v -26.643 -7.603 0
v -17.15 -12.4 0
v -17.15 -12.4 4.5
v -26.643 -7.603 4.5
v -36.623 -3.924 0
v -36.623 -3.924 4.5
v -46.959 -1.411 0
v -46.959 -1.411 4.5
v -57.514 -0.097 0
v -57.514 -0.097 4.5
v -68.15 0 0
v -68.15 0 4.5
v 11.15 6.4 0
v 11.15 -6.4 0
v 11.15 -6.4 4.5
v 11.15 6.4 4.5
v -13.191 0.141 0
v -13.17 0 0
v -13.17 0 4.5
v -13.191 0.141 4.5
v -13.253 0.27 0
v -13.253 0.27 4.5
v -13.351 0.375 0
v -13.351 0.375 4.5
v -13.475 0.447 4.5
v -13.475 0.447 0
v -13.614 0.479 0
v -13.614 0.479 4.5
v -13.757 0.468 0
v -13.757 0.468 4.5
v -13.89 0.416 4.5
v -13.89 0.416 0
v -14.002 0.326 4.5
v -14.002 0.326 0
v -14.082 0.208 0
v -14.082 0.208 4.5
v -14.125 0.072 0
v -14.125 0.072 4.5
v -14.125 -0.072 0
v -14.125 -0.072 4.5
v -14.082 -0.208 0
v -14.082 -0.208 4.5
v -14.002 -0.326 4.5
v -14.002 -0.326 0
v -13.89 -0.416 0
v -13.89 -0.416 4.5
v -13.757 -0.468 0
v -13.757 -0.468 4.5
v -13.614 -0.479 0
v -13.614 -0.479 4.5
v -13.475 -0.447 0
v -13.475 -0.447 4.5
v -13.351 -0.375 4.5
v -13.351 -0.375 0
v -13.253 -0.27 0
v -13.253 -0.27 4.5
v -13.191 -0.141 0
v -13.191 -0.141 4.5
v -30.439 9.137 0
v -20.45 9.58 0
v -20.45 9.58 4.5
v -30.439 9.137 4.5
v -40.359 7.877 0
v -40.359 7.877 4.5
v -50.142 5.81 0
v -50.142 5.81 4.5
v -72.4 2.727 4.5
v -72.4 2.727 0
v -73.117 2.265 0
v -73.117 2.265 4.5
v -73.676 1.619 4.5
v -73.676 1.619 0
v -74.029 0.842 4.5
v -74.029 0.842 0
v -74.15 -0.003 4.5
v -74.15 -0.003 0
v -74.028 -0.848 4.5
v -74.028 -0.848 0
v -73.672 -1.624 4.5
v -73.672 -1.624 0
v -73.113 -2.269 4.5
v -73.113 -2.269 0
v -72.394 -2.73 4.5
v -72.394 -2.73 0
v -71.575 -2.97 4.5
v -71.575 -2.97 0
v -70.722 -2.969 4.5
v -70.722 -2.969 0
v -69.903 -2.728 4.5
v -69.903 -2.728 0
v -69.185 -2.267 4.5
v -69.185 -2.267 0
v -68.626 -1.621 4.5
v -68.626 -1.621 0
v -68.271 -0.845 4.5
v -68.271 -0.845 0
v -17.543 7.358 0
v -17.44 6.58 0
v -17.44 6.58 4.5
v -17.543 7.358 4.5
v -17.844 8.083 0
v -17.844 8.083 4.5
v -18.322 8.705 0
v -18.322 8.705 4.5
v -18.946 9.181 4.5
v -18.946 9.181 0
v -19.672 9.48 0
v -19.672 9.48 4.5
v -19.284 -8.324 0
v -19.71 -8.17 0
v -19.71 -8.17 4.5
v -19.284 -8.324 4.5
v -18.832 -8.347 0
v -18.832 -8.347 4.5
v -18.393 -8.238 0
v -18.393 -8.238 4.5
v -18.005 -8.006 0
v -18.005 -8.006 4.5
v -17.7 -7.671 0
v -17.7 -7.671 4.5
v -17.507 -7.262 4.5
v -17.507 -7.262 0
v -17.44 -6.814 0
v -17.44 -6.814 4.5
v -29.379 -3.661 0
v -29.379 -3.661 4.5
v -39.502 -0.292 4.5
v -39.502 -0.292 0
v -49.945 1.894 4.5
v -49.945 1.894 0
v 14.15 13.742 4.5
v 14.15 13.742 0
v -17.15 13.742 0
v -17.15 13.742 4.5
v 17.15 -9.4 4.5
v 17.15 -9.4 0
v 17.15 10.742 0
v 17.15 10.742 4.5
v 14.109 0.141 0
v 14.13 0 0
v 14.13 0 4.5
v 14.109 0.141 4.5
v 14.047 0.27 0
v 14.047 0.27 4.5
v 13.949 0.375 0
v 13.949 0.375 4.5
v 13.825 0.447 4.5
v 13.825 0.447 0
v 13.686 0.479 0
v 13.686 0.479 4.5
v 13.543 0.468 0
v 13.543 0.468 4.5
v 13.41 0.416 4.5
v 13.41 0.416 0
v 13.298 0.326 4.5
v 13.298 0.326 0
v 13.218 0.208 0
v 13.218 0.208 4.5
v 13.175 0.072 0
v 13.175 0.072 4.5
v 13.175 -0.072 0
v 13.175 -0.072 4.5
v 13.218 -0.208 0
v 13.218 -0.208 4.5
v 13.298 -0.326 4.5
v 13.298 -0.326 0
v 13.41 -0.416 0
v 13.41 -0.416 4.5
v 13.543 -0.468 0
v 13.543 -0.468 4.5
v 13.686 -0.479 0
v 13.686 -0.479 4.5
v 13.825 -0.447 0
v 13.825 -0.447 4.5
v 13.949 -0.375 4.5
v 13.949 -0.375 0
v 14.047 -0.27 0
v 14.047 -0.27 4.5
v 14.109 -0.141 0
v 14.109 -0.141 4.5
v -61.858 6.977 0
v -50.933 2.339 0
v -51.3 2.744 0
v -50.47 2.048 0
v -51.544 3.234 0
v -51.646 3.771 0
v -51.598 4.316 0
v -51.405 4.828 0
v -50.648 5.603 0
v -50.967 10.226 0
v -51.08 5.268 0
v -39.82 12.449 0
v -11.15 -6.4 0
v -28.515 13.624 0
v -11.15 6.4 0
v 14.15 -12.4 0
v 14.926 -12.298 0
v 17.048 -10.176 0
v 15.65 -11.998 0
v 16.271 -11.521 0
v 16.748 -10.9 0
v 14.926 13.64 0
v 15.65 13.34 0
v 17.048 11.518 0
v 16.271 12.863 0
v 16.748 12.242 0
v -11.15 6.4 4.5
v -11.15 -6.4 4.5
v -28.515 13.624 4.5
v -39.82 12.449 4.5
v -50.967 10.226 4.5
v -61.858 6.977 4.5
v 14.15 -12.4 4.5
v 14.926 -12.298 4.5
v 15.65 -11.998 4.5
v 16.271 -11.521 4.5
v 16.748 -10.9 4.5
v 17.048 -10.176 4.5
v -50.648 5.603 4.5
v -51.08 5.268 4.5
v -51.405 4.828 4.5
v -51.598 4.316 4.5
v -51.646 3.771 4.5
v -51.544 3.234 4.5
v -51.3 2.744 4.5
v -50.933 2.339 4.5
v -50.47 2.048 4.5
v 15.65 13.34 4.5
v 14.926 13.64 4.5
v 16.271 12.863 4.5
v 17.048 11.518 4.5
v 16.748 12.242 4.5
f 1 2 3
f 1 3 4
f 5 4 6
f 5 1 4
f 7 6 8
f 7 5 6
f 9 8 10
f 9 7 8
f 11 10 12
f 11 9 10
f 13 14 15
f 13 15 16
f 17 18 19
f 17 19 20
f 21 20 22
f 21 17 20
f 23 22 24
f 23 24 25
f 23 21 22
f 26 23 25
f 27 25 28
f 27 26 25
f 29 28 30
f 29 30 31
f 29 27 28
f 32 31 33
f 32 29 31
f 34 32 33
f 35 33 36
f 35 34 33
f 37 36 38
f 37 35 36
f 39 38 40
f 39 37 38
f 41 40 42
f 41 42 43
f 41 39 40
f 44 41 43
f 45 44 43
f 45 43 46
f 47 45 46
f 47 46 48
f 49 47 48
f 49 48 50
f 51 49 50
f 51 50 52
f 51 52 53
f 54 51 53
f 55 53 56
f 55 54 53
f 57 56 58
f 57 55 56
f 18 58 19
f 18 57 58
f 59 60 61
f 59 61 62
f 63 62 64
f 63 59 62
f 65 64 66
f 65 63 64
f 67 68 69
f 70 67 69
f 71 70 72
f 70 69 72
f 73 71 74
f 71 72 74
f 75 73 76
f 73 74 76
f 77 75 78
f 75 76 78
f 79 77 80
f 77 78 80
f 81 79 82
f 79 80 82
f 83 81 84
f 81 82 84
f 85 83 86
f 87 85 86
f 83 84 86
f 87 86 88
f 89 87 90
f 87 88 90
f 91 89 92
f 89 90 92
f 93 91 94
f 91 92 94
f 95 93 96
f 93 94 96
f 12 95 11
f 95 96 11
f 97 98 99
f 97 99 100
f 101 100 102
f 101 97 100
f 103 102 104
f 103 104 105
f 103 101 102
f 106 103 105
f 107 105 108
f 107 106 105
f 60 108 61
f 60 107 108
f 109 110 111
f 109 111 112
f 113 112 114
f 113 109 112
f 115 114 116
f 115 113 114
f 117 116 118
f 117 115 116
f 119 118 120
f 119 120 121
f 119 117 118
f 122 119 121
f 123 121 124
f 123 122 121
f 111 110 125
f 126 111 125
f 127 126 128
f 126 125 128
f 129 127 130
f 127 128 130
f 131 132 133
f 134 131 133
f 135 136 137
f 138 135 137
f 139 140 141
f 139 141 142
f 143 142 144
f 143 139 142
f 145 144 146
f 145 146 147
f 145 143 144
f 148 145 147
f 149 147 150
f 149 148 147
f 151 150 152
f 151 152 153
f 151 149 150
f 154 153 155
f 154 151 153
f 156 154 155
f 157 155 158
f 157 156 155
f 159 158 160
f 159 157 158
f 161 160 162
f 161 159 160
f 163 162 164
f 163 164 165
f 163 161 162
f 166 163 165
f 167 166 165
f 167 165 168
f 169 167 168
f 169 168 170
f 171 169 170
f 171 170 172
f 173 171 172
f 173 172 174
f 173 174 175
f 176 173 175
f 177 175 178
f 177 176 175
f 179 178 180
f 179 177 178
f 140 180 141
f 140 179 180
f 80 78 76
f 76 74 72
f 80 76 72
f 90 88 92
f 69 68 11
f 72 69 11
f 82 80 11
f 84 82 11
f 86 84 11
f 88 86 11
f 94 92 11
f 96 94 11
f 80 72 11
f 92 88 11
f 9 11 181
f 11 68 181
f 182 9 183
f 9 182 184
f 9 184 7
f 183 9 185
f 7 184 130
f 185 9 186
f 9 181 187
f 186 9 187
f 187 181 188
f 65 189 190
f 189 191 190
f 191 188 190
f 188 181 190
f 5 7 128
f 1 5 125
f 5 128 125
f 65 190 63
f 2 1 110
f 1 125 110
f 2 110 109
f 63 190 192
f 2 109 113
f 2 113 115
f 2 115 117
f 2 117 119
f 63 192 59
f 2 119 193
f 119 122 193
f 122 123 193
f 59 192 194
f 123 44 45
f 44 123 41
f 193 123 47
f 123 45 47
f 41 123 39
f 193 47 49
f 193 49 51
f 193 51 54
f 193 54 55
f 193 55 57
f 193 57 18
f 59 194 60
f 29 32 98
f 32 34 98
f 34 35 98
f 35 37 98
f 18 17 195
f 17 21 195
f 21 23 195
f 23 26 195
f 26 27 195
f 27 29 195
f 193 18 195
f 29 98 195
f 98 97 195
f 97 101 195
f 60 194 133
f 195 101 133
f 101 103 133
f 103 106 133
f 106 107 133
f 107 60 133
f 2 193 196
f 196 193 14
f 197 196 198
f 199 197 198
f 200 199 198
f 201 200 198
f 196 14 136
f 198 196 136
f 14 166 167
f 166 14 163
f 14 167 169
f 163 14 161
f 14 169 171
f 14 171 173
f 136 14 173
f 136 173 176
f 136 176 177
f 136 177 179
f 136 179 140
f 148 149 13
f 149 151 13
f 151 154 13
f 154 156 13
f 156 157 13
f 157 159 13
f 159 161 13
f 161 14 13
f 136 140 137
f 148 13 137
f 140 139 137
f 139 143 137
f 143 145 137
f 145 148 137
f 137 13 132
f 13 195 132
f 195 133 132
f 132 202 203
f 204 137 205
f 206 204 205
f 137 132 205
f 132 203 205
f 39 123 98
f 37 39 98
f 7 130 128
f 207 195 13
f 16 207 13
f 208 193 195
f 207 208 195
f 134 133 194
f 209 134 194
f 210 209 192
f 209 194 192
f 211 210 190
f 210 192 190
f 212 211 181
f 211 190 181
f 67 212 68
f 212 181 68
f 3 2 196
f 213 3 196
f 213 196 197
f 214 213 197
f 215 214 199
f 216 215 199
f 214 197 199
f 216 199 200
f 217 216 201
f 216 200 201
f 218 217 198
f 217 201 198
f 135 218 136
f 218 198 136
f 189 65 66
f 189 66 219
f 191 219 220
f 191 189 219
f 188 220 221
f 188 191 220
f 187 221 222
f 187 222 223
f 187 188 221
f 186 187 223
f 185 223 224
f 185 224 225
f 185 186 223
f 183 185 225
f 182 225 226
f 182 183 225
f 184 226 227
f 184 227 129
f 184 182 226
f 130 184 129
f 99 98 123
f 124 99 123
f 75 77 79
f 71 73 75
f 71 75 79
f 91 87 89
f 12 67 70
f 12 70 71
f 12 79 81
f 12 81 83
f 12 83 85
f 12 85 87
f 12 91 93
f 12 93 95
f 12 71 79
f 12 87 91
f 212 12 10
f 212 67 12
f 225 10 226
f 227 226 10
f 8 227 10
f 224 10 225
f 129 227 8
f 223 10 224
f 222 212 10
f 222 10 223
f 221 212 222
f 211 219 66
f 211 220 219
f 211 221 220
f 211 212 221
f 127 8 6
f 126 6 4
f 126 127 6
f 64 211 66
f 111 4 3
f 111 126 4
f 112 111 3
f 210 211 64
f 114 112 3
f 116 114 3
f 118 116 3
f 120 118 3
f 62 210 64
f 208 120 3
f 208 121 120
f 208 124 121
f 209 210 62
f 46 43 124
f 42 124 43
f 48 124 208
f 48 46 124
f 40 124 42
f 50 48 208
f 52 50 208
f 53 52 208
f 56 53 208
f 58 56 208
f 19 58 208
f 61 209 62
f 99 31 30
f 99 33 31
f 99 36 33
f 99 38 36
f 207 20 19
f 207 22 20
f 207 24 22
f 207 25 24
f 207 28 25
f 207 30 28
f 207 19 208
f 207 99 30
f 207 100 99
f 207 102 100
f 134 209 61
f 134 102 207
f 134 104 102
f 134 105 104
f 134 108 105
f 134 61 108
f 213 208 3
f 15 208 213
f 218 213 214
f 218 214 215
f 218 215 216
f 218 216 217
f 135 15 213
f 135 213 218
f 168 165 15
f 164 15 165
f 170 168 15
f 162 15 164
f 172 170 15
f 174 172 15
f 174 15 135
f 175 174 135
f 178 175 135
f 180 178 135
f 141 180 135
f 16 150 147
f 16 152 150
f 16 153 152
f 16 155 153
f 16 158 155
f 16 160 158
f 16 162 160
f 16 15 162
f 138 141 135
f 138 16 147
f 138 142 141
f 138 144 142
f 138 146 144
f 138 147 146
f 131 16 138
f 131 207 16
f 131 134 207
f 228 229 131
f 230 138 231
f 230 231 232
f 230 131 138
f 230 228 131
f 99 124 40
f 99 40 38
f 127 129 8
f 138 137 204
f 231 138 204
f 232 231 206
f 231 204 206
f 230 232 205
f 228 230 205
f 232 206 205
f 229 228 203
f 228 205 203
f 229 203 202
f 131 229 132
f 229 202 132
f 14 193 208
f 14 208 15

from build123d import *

# Parameters (mm, degrees)
SKETCH_R  = 0.48
SKETCH_W  = 22.3
SKETCH_H  = 12.8
PAD_DEPTH = 4.5


with BuildPart() as part:
    # Sketch → Pad (new body)
    with BuildSketch(Plane.XY):
        with BuildLine():
            Line((-17.15, -12.4), (14.15, -12.4))
            ThreePointArc((14.15, -12.4), (16.27132, -11.52132), (17.15, -9.4))
            Line((17.15, -9.4), (17.15, 10.741965))
            ThreePointArc((17.15, 10.741965), (16.27132, 12.863286), (14.15, 13.741965))
            Line((14.15, 13.741965), (-17.15, 13.741965))
            ThreePointArc((-17.15, 13.741965), (-45.41951, 11.467422), (-72.4, 2.727178))
            ThreePointArc((-72.4, 2.727178), (-72.770186, -2.524876), (-68.15, -1e-06))
            ThreePointArc((-17.15, -12.4), (-41.755087, -2.51931), (-68.15, -1e-06))
        make_face()
        with Locations((-13.65, 0)):
            Circle(SKETCH_R, mode=Mode.SUBTRACT)
        with Locations((13.65, 0)):
            Circle(SKETCH_R, mode=Mode.SUBTRACT)
        Rectangle(SKETCH_W, SKETCH_H, mode=Mode.SUBTRACT)
        with BuildLine():
            Line((-17.44, 6.580017), (-17.44, -6.814013))
            ThreePointArc((-19.71, -8.17), (-18.190253, -8.136095), (-17.44, -6.814013))
            ThreePointArc((-19.71, -8.17), (-34.392185, -1.83077), (-49.944735, 1.893553))
            ThreePointArc((-50.141709, 5.809641), (-51.645768, 3.770991), (-49.944735, 1.893553))
            ThreePointArc((-20.45, 9.58), (-35.411915, 8.608801), (-50.141709, 5.809641))
            ThreePointArc((-17.44, 6.580017), (-18.322218, 8.70487), (-20.45, 9.58))
        make_face(mode=Mode.SUBTRACT)
    extrude(amount=PAD_DEPTH)


solid = part.part
